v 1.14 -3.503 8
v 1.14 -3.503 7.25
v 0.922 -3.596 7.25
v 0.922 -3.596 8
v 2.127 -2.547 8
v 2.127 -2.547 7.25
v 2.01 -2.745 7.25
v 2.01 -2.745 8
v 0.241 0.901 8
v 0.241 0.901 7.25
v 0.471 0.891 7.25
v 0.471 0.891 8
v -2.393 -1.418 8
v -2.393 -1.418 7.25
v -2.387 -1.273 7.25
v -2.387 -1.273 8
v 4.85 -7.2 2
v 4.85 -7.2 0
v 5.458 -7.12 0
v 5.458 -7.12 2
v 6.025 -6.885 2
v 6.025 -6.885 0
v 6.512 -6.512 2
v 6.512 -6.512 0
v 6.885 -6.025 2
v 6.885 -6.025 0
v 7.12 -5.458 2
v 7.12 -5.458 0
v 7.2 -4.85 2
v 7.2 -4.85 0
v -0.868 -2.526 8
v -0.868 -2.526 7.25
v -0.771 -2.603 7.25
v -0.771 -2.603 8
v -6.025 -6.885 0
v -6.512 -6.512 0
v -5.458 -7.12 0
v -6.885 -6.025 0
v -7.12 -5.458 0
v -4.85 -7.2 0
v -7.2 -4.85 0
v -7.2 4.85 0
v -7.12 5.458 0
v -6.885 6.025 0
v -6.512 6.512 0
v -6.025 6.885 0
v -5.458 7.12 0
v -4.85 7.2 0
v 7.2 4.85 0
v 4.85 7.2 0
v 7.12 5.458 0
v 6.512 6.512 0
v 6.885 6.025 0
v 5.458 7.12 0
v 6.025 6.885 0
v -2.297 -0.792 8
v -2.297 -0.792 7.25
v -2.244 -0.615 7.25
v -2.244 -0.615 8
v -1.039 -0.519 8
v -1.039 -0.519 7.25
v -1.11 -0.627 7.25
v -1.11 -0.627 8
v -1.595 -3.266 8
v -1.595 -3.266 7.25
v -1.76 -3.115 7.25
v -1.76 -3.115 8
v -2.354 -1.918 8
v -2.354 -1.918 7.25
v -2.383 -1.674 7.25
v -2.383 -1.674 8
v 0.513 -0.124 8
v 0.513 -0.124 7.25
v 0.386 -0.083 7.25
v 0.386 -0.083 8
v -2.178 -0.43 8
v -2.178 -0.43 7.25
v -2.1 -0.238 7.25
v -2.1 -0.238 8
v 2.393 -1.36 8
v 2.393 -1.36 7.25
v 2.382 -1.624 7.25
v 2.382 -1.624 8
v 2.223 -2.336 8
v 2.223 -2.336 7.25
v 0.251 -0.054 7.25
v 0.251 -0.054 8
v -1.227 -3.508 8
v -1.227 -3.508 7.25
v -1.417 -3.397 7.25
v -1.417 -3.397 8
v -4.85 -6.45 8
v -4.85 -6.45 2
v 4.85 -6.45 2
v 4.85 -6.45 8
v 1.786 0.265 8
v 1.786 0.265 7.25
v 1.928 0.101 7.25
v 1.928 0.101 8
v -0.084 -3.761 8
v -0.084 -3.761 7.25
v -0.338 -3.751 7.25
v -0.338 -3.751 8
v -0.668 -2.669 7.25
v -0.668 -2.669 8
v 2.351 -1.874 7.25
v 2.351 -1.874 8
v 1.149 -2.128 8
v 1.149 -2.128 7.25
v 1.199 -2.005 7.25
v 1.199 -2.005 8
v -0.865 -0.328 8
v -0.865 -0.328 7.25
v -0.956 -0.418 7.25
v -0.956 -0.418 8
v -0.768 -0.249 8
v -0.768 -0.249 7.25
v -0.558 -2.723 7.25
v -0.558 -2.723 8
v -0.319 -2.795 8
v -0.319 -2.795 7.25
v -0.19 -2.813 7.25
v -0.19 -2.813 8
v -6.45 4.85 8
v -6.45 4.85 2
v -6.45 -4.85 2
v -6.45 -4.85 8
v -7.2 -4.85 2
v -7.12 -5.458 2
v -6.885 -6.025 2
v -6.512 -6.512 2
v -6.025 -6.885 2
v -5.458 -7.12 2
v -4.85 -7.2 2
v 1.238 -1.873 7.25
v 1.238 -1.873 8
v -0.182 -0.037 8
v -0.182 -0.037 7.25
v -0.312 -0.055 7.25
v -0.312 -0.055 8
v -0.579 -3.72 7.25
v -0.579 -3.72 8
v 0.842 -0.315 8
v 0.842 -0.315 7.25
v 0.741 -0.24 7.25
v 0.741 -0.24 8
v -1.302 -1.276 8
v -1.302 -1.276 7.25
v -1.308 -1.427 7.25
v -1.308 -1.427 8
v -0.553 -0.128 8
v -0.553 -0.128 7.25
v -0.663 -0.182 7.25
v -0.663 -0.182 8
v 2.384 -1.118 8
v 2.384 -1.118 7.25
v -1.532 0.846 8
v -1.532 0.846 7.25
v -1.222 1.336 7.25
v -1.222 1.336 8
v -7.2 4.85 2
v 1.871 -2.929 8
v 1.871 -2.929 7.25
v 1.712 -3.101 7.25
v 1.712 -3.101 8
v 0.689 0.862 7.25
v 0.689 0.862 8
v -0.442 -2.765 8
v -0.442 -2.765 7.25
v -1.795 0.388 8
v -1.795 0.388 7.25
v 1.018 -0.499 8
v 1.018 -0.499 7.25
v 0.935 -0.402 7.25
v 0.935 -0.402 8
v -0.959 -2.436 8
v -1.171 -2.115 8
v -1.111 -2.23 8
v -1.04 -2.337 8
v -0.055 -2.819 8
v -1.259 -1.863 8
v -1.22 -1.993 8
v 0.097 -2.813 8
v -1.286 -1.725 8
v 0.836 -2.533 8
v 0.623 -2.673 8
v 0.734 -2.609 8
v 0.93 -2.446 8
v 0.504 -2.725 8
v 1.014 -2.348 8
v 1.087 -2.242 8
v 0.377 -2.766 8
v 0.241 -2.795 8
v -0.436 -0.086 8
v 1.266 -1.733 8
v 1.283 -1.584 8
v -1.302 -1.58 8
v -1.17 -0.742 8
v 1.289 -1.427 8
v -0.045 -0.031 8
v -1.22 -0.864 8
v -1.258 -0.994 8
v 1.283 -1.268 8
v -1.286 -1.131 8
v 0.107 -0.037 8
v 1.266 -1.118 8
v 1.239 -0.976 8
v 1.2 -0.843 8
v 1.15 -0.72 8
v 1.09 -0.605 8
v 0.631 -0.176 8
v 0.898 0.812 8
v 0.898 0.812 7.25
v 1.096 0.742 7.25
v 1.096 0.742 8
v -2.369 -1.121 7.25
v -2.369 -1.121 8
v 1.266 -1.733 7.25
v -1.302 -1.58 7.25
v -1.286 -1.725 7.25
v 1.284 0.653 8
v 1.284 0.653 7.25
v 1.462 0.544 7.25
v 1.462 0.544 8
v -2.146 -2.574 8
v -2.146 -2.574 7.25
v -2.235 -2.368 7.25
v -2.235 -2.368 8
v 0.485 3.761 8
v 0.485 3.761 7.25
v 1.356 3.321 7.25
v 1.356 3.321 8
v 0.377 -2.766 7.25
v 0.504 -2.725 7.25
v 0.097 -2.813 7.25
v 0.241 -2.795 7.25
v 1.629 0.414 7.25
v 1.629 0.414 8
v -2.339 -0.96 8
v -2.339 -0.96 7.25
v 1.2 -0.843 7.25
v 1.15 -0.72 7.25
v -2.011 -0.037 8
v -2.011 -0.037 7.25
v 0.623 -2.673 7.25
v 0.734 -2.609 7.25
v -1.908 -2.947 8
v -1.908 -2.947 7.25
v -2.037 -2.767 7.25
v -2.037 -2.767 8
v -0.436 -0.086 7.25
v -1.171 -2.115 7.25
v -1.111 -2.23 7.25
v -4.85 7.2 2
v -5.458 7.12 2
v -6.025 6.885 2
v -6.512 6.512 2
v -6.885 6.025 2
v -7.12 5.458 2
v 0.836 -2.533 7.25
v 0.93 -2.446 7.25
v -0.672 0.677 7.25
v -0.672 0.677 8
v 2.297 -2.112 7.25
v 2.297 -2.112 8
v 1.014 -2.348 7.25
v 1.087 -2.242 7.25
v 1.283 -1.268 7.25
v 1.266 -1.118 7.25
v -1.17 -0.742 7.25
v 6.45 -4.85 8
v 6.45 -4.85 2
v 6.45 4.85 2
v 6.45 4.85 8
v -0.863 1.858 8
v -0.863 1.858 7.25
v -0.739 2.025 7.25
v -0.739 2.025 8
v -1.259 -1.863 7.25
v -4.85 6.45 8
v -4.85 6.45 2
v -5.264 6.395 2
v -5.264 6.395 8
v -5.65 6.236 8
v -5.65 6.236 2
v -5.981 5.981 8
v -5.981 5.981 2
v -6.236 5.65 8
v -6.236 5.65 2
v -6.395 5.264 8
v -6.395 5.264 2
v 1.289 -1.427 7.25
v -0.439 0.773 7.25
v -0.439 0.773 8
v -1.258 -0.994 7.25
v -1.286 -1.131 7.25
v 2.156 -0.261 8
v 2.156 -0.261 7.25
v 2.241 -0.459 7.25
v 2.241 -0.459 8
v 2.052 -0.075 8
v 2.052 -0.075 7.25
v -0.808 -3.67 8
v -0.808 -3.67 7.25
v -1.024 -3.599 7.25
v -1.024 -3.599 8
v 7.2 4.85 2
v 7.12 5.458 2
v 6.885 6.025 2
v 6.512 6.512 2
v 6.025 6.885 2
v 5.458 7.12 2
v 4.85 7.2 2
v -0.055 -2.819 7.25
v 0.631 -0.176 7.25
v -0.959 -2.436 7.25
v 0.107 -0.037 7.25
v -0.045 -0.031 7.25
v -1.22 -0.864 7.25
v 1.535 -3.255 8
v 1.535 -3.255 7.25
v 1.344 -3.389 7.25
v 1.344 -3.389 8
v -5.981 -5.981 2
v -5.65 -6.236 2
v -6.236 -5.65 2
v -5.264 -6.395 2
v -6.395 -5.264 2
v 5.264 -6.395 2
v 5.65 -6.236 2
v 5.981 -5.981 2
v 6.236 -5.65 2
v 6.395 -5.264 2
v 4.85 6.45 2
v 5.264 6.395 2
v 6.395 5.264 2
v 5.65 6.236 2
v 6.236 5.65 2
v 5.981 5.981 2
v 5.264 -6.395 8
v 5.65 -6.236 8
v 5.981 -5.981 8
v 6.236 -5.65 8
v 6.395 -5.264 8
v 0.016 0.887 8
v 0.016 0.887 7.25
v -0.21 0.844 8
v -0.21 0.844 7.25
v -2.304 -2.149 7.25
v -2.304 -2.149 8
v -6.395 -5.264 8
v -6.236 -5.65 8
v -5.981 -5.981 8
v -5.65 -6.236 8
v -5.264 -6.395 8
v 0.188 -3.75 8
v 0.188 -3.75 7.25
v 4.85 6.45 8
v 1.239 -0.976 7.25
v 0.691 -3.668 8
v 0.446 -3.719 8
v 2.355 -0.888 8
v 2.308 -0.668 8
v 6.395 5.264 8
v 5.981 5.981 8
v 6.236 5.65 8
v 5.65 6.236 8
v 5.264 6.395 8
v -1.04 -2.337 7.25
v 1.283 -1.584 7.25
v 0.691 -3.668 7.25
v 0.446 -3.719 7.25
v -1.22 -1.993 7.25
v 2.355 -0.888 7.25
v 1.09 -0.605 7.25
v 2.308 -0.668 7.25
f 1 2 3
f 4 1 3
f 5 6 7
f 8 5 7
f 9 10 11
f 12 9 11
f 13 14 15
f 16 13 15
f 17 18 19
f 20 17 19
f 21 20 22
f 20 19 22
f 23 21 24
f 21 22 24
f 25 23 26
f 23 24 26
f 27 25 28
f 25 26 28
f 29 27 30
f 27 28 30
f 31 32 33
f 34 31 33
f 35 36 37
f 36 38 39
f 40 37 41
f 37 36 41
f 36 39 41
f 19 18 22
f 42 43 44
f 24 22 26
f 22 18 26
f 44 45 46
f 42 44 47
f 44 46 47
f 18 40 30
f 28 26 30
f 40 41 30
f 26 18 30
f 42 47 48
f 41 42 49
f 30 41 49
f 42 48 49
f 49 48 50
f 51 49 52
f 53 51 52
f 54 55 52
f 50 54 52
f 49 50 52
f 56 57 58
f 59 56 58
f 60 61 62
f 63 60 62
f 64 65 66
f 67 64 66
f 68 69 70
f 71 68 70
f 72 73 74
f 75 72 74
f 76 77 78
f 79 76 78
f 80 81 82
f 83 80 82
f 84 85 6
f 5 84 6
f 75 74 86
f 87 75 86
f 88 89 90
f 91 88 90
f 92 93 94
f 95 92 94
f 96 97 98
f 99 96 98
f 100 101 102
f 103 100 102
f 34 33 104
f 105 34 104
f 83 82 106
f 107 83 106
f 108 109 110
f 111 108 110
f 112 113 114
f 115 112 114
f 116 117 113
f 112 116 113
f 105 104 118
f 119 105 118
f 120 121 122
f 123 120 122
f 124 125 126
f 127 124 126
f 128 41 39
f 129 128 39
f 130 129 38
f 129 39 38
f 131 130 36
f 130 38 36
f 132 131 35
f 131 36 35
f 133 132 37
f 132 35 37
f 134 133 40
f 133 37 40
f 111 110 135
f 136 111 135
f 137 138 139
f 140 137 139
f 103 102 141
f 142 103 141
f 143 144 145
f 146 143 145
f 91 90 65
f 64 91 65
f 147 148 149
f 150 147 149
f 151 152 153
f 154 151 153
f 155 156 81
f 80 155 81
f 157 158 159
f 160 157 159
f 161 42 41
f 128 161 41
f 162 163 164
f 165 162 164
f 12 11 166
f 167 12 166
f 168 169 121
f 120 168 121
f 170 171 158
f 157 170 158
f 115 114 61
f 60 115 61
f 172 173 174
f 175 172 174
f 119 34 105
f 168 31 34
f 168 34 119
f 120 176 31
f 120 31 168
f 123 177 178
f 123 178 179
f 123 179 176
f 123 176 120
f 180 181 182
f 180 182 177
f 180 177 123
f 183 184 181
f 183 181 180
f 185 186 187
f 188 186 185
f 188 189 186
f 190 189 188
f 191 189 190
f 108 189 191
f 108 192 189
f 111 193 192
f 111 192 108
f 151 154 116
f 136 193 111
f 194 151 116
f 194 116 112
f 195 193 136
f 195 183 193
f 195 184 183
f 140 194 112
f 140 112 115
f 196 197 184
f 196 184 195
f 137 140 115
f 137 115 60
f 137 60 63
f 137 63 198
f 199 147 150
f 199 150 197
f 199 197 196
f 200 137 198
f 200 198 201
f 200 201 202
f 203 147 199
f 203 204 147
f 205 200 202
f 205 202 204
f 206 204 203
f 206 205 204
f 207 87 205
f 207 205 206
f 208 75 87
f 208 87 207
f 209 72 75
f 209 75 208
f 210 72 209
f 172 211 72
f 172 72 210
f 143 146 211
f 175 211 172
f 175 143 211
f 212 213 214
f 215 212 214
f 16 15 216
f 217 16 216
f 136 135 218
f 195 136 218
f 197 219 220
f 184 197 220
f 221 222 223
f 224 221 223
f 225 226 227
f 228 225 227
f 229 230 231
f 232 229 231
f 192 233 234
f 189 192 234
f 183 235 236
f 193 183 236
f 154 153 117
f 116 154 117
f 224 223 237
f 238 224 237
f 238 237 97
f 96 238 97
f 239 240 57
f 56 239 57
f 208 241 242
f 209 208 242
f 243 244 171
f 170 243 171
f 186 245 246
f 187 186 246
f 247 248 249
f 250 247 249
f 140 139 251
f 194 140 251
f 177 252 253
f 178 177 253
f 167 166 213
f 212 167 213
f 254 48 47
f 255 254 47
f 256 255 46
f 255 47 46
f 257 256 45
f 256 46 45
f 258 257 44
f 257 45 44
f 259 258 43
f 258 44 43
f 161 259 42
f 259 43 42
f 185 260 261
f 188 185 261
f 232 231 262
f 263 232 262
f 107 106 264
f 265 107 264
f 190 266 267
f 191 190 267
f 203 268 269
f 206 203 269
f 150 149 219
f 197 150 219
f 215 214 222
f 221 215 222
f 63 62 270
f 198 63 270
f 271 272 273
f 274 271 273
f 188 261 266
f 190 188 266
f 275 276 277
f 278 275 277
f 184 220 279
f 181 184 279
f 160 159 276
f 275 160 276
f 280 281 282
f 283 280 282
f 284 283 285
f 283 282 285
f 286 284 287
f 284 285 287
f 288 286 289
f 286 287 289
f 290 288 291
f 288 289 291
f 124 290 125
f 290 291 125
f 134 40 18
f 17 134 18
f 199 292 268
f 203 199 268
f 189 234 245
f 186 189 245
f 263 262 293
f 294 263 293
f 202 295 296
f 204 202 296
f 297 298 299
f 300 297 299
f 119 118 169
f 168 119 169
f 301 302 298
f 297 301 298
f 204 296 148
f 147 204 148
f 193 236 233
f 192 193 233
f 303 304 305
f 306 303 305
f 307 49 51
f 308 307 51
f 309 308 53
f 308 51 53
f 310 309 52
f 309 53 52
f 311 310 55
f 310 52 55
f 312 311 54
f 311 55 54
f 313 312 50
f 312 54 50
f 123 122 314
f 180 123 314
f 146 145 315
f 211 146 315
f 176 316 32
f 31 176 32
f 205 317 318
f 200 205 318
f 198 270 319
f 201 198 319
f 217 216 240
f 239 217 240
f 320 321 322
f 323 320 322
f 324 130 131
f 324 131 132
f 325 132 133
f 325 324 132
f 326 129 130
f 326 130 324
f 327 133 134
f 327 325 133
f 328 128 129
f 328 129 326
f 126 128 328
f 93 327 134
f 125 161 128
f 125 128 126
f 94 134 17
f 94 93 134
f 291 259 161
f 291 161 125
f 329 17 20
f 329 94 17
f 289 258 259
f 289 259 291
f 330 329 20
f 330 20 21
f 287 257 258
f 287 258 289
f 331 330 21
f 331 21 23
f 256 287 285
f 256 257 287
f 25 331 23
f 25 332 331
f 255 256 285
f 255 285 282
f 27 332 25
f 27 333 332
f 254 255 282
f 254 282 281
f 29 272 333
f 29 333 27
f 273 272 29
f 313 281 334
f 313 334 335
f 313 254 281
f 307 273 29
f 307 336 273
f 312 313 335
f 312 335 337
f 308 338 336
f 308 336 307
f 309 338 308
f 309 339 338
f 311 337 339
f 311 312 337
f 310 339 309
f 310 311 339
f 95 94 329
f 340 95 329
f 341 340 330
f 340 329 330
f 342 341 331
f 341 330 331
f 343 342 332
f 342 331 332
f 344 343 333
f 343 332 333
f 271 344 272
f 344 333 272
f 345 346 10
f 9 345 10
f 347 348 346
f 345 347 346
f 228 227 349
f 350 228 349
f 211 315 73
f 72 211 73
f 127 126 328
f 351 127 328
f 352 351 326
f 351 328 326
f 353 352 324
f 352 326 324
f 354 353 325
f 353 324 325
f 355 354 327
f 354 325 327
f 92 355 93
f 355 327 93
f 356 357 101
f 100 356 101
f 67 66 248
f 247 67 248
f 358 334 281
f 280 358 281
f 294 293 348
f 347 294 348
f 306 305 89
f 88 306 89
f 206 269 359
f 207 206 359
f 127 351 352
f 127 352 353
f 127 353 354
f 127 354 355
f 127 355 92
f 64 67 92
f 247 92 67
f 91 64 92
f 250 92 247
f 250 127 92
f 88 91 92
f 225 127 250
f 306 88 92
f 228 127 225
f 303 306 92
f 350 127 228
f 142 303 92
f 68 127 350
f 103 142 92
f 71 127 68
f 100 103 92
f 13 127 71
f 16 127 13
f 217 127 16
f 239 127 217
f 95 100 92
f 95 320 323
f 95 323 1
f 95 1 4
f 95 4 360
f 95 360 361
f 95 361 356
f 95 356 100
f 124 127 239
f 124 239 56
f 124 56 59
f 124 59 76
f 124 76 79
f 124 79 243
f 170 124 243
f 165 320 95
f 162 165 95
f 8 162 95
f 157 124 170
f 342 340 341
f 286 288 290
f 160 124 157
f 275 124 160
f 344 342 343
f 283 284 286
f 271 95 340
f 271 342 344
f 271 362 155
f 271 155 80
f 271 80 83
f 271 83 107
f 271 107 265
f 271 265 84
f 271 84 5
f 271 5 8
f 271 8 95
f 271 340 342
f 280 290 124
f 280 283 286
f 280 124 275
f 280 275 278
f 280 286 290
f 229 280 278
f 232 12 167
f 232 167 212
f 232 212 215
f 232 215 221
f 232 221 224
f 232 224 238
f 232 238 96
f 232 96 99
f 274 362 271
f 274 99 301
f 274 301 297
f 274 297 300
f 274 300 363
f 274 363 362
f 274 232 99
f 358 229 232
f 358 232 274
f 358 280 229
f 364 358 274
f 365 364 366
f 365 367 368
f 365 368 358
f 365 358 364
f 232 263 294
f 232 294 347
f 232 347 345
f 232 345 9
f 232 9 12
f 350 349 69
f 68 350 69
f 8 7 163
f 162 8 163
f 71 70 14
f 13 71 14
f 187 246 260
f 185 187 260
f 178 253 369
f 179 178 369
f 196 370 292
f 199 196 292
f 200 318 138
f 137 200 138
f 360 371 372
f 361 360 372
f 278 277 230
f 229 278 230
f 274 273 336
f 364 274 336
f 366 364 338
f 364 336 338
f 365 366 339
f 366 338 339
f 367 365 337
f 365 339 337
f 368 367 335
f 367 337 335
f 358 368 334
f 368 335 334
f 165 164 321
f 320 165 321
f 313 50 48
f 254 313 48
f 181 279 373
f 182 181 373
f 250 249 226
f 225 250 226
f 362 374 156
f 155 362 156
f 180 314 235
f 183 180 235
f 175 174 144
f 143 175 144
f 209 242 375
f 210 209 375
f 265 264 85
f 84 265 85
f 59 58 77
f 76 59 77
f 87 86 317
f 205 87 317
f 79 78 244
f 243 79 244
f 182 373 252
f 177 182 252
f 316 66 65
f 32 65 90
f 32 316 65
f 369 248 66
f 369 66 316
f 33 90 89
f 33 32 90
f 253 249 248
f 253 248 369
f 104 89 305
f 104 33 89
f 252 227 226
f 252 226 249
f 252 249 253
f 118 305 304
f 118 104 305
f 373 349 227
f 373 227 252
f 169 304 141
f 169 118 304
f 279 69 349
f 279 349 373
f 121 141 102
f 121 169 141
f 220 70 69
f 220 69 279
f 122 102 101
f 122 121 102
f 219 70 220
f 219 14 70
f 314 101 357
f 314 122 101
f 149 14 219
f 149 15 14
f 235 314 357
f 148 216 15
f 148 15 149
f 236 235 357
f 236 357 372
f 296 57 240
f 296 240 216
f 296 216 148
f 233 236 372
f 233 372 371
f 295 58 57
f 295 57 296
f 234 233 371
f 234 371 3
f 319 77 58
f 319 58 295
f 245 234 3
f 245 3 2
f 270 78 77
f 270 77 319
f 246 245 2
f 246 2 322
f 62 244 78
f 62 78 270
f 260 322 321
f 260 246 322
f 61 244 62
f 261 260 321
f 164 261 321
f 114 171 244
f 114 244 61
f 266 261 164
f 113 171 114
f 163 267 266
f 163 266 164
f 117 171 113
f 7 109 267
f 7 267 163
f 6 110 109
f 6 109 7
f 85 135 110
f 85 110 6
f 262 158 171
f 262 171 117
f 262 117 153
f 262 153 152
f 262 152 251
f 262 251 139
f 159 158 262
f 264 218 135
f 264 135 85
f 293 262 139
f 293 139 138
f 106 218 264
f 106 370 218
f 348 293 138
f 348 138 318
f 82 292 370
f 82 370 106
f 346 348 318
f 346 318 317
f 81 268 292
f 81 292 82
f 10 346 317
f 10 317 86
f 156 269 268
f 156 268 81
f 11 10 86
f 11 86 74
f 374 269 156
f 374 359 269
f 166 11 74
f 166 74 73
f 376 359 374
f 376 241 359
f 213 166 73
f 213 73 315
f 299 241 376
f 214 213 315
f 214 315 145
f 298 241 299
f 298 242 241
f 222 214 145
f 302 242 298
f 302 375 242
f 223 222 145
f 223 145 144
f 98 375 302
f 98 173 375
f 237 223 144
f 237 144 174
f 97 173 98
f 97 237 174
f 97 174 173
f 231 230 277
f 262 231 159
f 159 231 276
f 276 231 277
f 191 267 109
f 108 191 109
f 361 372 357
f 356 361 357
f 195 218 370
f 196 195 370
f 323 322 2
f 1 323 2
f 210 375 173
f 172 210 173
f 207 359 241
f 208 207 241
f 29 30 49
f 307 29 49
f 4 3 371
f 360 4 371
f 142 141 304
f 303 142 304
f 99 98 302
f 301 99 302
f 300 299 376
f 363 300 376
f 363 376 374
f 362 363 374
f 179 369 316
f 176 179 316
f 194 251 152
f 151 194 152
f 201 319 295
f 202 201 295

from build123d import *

# Parameters (mm, degrees)
F1_DEPTH = 2
F2_DEPTH = 8
F3_DEPTH = 7.25


with BuildPart() as f1:
    # F0 (on Top) → F1 (new body)
    with BuildSketch(Plane.XY):
        with BuildLine():
            Line((4.85, 7.2), (-4.85, 7.2))
            ThreePointArc((-4.85, 7.2), (-6.5117009358, 6.5117009358), (-7.2, 4.85))
            Line((-7.2, 4.85), (-7.2, -4.85))
            ThreePointArc((-7.2, -4.85), (-6.5117009358, -6.5117009358), (-4.85, -7.2))
            Line((-4.85, -7.2), (4.85, -7.2))
            ThreePointArc((4.85, -7.2), (6.5117009358, -6.5117009358), (7.2, -4.85))
            Line((7.2, -4.85), (7.2, 4.85))
            ThreePointArc((7.2, 4.85), (6.5117009358, 6.5117009358), (4.85, 7.2))
        make_face()
        with BuildLine():
            ThreePointArc((6.45, -4.85), (5.9813708499, -5.9813708499), (4.85, -6.45))
            Line((4.85, -6.45), (-4.85, -6.45))
            ThreePointArc((-4.85, -6.45), (-5.9813708499, -5.9813708499), (-6.45, -4.85))
            Line((-6.45, -4.85), (-6.45, 4.85))
            ThreePointArc((-6.45, 4.85), (-5.9813708499, 5.9813708499), (-4.85, 6.45))
            Line((-4.85, 6.45), (4.85, 6.45))
            ThreePointArc((4.85, 6.45), (5.9813708499, 5.9813708499), (6.45, 4.85))
            Line((6.45, 4.85), (6.45, -4.85))
        make_face(mode=Mode.SUBTRACT)
    extrude(amount=F1_DEPTH)

    # F0 (on Top) → F2 (join)
    with BuildSketch(Plane.XY):
        with BuildLine():
            Line((-4.85, -6.45), (4.85, -6.45))
            ThreePointArc((4.85, -6.45), (5.9813708499, -5.9813708499), (6.45, -4.85))
            Line((6.45, -4.85), (6.45, 4.85))
            ThreePointArc((6.45, 4.85), (5.9813708499, 5.9813708499), (4.85, 6.45))
            Line((4.85, 6.45), (-4.85, 6.45))
            ThreePointArc((-4.85, 6.45), (-5.9813708499, 5.9813708499), (-6.45, 4.85))
            Line((-6.45, 4.85), (-6.45, -4.85))
            ThreePointArc((-6.45, -4.85), (-5.9813708499, -5.9813708499), (-4.85, -6.45))
        make_face()
        Polygon((1.355533, 3.320697), (-0.67179, 0.676571), (-0.439293, 0.773395), (-0.210383, 0.843921), (0.016137, 0.886954), (0.241462, 0.901298), (0.470596, 0.891361), (0.689421, 0.861552), (0.897936, 0.81187), (1.096141, 0.742316), (1.284036, 0.652888), (1.461621, 0.543588), (1.628896, 0.414415), (1.785861, 0.265369), (1.928183, 0.100858), (2.051528, -0.07471), (2.155898, -0.261335), (2.241291, -0.459016), (2.307708, -0.667755), (2.355149, -0.887551), (2.383613, -1.118404), (2.393101, -1.360314), (2.382455, -1.62389), (2.350517, -1.874317), (2.297286, -2.111595), (2.222763, -2.335724), (2.126948, -2.546704), (2.00984, -2.744536), (1.871441, -2.929218), (1.711749, -3.100751), (1.534649, -3.2554), (1.344027, -3.38943), (1.139883, -3.502839), (0.922217, -3.595628), (0.691027, -3.667798), (0.446316, -3.719348), (0.188082, -3.750277), (-0.083675, -3.760587), (-0.337875, -3.750502), (-0.579299, -3.720244), (-0.807948, -3.669815), (-1.023822, -3.599214), (-1.22692, -3.508442), (-1.417243, -3.397498), (-1.594791, -3.266383), (-1.759563, -3.115096), (-1.908048, -2.947372), (-2.036736, -2.766948), (-2.145625, -2.573824), (-2.234717, -2.367999), (-2.30401, -2.149473), (-2.353505, -1.918246), (-2.383202, -1.674319), (-2.393101, -1.417691), (-2.387124, -1.273221), (-2.369194, -1.12072), (-2.33931, -0.960188), (-2.297473, -0.791624), (-2.243682, -0.615029), (-2.177937, -0.430403), (-2.100239, -0.237745), (-2.010587, -0.037056), (-1.795423, 0.388416), (-1.532445, 0.846013), (-1.221653, 1.335735), (-0.863046, 1.857582), (-0.73873, 2.024932), (0.485314, 3.760587), align=None, mode=Mode.SUBTRACT)
    extrude(amount=F2_DEPTH)



with BuildPart() as f2:
    # F0 (on Top) → F2, piece 2 (new body)
    with BuildSketch(Plane.XY):
        Polygon((-1.302227, -1.275519), (-1.307719, -1.427254), (-1.302265, -1.580035), (-1.285903, -1.725196), (-1.258634, -1.862737), (-1.220458, -1.992657), (-1.171373, -2.114957), (-1.111381, -2.229636), (-1.040482, -2.336695), (-0.958675, -2.436134), (-0.868201, -2.525786), (-0.771303, -2.603484), (-0.667979, -2.669228), (-0.558231, -2.723019), (-0.442057, -2.764857), (-0.319459, -2.79474), (-0.190435, -2.812671), (-0.054986, -2.818648), (0.097421, -2.81282), (0.241462, -2.795338), (0.377135, -2.766201), (0.50444, -2.72541), (0.623378, -2.672964), (0.733948, -2.608863), (0.836151, -2.533107), (0.929986, -2.445697), (1.014035, -2.348201), (1.086877, -2.242188), (1.148512, -2.127658), (1.198941, -2.004611), (1.238164, -1.873047), (1.26618, -1.732966), (1.28299, -1.584369), (1.288593, -1.427254), (1.283064, -1.267936), (1.266479, -1.117508), (1.238836, -0.97597), (1.200137, -0.843323), (1.15038, -0.719566), (1.089566, -0.6047), (1.017696, -0.498725), (0.934768, -0.401639), (0.842053, -0.314789), (0.740821, -0.239519), (0.631073, -0.175829), (0.512807, -0.123719), (0.386025, -0.083189), (0.250726, -0.054239), (0.10691, -0.036869), (-0.045423, -0.031079), (-0.18203, -0.037131), (-0.312137, -0.055285), (-0.435744, -0.085543), (-0.552852, -0.127903), (-0.663459, -0.182366), (-0.767567, -0.248933), (-0.865176, -0.327602), (-0.956284, -0.418374), (-1.038652, -0.518859), (-1.110037, -0.626665), (-1.17044, -0.741793), (-1.21986, -0.864242), (-1.258298, -0.994013), (-1.285754, -1.131105), align=None)
    extrude(amount=F2_DEPTH)


with BuildPart() as f1_1:
    add(f1.part)

    add(f2.part)  # F3 merges F2
    # F0 (on Top) → F3 (join)
    with BuildSketch(Plane.XY):
        Polygon((-0.439293, 0.773395), (-0.67179, 0.676571), (1.355533, 3.320697), (0.485314, 3.760587), (-0.73873, 2.024932), (-0.863046, 1.857582), (-1.221653, 1.335735), (-1.532445, 0.846013), (-1.795423, 0.388416), (-2.010587, -0.037056), (-2.100239, -0.237745), (-2.177937, -0.430403), (-2.243682, -0.615029), (-2.297473, -0.791624), (-2.33931, -0.960188), (-2.369194, -1.12072), (-2.387124, -1.273221), (-2.393101, -1.417691), (-2.383202, -1.674319), (-2.353505, -1.918246), (-2.30401, -2.149473), (-2.234717, -2.367999), (-2.145625, -2.573824), (-2.036736, -2.766948), (-1.908048, -2.947372), (-1.759563, -3.115096), (-1.594791, -3.266383), (-1.417243, -3.397498), (-1.22692, -3.508442), (-1.023822, -3.599214), (-0.807948, -3.669815), (-0.579299, -3.720244), (-0.337875, -3.750502), (-0.083675, -3.760587), (0.188082, -3.750277), (0.446316, -3.719348), (0.691027, -3.667798), (0.922217, -3.595628), (1.139883, -3.502839), (1.344027, -3.38943), (1.534649, -3.2554), (1.711749, -3.100751), (1.871441, -2.929218), (2.00984, -2.744536), (2.126948, -2.546704), (2.222763, -2.335724), (2.297286, -2.111595), (2.350517, -1.874317), (2.382455, -1.62389), (2.393101, -1.360314), (2.383613, -1.118404), (2.355149, -0.887551), (2.307708, -0.667755), (2.241291, -0.459016), (2.155898, -0.261335), (2.051528, -0.07471), (1.928183, 0.100858), (1.785861, 0.265369), (1.628896, 0.414415), (1.461621, 0.543588), (1.284036, 0.652888), (1.096141, 0.742316), (0.897936, 0.81187), (0.689421, 0.861552), (0.470596, 0.891361), (0.241462, 0.901298), (0.016137, 0.886954), (-0.210383, 0.843921), align=None)
        Polygon((-1.302265, -1.580035), (-1.307719, -1.427254), (-1.302227, -1.275519), (-1.285754, -1.131105), (-1.258298, -0.994013), (-1.21986, -0.864242), (-1.17044, -0.741793), (-1.110037, -0.626665), (-1.038652, -0.518859), (-0.956284, -0.418374), (-0.865176, -0.327602), (-0.767567, -0.248933), (-0.663459, -0.182366), (-0.552852, -0.127903), (-0.435744, -0.085543), (-0.312137, -0.055285), (-0.18203, -0.037131), (-0.045423, -0.031079), (0.10691, -0.036869), (0.250726, -0.054239), (0.386025, -0.083189), (0.512807, -0.123719), (0.631073, -0.175829), (0.740821, -0.239519), (0.842053, -0.314789), (0.934768, -0.401639), (1.017696, -0.498725), (1.089566, -0.6047), (1.15038, -0.719566), (1.200137, -0.843323), (1.238836, -0.97597), (1.266479, -1.117508), (1.283064, -1.267936), (1.288593, -1.427254), (1.28299, -1.584369), (1.26618, -1.732966), (1.238164, -1.873047), (1.198941, -2.004611), (1.148512, -2.127658), (1.086877, -2.242188), (1.014035, -2.348201), (0.929986, -2.445697), (0.836151, -2.533107), (0.733948, -2.608863), (0.623378, -2.672964), (0.50444, -2.72541), (0.377135, -2.766201), (0.241462, -2.795338), (0.097421, -2.81282), (-0.054986, -2.818648), (-0.190435, -2.812671), (-0.319459, -2.79474), (-0.442057, -2.764857), (-0.558231, -2.723019), (-0.667979, -2.669228), (-0.771303, -2.603484), (-0.868201, -2.525786), (-0.958675, -2.436134), (-1.040482, -2.336695), (-1.111381, -2.229636), (-1.171373, -2.114957), (-1.220458, -1.992657), (-1.258634, -1.862737), (-1.285903, -1.725196), align=None, mode=Mode.SUBTRACT)
    extrude(amount=F3_DEPTH)


solid = f1_1.part
